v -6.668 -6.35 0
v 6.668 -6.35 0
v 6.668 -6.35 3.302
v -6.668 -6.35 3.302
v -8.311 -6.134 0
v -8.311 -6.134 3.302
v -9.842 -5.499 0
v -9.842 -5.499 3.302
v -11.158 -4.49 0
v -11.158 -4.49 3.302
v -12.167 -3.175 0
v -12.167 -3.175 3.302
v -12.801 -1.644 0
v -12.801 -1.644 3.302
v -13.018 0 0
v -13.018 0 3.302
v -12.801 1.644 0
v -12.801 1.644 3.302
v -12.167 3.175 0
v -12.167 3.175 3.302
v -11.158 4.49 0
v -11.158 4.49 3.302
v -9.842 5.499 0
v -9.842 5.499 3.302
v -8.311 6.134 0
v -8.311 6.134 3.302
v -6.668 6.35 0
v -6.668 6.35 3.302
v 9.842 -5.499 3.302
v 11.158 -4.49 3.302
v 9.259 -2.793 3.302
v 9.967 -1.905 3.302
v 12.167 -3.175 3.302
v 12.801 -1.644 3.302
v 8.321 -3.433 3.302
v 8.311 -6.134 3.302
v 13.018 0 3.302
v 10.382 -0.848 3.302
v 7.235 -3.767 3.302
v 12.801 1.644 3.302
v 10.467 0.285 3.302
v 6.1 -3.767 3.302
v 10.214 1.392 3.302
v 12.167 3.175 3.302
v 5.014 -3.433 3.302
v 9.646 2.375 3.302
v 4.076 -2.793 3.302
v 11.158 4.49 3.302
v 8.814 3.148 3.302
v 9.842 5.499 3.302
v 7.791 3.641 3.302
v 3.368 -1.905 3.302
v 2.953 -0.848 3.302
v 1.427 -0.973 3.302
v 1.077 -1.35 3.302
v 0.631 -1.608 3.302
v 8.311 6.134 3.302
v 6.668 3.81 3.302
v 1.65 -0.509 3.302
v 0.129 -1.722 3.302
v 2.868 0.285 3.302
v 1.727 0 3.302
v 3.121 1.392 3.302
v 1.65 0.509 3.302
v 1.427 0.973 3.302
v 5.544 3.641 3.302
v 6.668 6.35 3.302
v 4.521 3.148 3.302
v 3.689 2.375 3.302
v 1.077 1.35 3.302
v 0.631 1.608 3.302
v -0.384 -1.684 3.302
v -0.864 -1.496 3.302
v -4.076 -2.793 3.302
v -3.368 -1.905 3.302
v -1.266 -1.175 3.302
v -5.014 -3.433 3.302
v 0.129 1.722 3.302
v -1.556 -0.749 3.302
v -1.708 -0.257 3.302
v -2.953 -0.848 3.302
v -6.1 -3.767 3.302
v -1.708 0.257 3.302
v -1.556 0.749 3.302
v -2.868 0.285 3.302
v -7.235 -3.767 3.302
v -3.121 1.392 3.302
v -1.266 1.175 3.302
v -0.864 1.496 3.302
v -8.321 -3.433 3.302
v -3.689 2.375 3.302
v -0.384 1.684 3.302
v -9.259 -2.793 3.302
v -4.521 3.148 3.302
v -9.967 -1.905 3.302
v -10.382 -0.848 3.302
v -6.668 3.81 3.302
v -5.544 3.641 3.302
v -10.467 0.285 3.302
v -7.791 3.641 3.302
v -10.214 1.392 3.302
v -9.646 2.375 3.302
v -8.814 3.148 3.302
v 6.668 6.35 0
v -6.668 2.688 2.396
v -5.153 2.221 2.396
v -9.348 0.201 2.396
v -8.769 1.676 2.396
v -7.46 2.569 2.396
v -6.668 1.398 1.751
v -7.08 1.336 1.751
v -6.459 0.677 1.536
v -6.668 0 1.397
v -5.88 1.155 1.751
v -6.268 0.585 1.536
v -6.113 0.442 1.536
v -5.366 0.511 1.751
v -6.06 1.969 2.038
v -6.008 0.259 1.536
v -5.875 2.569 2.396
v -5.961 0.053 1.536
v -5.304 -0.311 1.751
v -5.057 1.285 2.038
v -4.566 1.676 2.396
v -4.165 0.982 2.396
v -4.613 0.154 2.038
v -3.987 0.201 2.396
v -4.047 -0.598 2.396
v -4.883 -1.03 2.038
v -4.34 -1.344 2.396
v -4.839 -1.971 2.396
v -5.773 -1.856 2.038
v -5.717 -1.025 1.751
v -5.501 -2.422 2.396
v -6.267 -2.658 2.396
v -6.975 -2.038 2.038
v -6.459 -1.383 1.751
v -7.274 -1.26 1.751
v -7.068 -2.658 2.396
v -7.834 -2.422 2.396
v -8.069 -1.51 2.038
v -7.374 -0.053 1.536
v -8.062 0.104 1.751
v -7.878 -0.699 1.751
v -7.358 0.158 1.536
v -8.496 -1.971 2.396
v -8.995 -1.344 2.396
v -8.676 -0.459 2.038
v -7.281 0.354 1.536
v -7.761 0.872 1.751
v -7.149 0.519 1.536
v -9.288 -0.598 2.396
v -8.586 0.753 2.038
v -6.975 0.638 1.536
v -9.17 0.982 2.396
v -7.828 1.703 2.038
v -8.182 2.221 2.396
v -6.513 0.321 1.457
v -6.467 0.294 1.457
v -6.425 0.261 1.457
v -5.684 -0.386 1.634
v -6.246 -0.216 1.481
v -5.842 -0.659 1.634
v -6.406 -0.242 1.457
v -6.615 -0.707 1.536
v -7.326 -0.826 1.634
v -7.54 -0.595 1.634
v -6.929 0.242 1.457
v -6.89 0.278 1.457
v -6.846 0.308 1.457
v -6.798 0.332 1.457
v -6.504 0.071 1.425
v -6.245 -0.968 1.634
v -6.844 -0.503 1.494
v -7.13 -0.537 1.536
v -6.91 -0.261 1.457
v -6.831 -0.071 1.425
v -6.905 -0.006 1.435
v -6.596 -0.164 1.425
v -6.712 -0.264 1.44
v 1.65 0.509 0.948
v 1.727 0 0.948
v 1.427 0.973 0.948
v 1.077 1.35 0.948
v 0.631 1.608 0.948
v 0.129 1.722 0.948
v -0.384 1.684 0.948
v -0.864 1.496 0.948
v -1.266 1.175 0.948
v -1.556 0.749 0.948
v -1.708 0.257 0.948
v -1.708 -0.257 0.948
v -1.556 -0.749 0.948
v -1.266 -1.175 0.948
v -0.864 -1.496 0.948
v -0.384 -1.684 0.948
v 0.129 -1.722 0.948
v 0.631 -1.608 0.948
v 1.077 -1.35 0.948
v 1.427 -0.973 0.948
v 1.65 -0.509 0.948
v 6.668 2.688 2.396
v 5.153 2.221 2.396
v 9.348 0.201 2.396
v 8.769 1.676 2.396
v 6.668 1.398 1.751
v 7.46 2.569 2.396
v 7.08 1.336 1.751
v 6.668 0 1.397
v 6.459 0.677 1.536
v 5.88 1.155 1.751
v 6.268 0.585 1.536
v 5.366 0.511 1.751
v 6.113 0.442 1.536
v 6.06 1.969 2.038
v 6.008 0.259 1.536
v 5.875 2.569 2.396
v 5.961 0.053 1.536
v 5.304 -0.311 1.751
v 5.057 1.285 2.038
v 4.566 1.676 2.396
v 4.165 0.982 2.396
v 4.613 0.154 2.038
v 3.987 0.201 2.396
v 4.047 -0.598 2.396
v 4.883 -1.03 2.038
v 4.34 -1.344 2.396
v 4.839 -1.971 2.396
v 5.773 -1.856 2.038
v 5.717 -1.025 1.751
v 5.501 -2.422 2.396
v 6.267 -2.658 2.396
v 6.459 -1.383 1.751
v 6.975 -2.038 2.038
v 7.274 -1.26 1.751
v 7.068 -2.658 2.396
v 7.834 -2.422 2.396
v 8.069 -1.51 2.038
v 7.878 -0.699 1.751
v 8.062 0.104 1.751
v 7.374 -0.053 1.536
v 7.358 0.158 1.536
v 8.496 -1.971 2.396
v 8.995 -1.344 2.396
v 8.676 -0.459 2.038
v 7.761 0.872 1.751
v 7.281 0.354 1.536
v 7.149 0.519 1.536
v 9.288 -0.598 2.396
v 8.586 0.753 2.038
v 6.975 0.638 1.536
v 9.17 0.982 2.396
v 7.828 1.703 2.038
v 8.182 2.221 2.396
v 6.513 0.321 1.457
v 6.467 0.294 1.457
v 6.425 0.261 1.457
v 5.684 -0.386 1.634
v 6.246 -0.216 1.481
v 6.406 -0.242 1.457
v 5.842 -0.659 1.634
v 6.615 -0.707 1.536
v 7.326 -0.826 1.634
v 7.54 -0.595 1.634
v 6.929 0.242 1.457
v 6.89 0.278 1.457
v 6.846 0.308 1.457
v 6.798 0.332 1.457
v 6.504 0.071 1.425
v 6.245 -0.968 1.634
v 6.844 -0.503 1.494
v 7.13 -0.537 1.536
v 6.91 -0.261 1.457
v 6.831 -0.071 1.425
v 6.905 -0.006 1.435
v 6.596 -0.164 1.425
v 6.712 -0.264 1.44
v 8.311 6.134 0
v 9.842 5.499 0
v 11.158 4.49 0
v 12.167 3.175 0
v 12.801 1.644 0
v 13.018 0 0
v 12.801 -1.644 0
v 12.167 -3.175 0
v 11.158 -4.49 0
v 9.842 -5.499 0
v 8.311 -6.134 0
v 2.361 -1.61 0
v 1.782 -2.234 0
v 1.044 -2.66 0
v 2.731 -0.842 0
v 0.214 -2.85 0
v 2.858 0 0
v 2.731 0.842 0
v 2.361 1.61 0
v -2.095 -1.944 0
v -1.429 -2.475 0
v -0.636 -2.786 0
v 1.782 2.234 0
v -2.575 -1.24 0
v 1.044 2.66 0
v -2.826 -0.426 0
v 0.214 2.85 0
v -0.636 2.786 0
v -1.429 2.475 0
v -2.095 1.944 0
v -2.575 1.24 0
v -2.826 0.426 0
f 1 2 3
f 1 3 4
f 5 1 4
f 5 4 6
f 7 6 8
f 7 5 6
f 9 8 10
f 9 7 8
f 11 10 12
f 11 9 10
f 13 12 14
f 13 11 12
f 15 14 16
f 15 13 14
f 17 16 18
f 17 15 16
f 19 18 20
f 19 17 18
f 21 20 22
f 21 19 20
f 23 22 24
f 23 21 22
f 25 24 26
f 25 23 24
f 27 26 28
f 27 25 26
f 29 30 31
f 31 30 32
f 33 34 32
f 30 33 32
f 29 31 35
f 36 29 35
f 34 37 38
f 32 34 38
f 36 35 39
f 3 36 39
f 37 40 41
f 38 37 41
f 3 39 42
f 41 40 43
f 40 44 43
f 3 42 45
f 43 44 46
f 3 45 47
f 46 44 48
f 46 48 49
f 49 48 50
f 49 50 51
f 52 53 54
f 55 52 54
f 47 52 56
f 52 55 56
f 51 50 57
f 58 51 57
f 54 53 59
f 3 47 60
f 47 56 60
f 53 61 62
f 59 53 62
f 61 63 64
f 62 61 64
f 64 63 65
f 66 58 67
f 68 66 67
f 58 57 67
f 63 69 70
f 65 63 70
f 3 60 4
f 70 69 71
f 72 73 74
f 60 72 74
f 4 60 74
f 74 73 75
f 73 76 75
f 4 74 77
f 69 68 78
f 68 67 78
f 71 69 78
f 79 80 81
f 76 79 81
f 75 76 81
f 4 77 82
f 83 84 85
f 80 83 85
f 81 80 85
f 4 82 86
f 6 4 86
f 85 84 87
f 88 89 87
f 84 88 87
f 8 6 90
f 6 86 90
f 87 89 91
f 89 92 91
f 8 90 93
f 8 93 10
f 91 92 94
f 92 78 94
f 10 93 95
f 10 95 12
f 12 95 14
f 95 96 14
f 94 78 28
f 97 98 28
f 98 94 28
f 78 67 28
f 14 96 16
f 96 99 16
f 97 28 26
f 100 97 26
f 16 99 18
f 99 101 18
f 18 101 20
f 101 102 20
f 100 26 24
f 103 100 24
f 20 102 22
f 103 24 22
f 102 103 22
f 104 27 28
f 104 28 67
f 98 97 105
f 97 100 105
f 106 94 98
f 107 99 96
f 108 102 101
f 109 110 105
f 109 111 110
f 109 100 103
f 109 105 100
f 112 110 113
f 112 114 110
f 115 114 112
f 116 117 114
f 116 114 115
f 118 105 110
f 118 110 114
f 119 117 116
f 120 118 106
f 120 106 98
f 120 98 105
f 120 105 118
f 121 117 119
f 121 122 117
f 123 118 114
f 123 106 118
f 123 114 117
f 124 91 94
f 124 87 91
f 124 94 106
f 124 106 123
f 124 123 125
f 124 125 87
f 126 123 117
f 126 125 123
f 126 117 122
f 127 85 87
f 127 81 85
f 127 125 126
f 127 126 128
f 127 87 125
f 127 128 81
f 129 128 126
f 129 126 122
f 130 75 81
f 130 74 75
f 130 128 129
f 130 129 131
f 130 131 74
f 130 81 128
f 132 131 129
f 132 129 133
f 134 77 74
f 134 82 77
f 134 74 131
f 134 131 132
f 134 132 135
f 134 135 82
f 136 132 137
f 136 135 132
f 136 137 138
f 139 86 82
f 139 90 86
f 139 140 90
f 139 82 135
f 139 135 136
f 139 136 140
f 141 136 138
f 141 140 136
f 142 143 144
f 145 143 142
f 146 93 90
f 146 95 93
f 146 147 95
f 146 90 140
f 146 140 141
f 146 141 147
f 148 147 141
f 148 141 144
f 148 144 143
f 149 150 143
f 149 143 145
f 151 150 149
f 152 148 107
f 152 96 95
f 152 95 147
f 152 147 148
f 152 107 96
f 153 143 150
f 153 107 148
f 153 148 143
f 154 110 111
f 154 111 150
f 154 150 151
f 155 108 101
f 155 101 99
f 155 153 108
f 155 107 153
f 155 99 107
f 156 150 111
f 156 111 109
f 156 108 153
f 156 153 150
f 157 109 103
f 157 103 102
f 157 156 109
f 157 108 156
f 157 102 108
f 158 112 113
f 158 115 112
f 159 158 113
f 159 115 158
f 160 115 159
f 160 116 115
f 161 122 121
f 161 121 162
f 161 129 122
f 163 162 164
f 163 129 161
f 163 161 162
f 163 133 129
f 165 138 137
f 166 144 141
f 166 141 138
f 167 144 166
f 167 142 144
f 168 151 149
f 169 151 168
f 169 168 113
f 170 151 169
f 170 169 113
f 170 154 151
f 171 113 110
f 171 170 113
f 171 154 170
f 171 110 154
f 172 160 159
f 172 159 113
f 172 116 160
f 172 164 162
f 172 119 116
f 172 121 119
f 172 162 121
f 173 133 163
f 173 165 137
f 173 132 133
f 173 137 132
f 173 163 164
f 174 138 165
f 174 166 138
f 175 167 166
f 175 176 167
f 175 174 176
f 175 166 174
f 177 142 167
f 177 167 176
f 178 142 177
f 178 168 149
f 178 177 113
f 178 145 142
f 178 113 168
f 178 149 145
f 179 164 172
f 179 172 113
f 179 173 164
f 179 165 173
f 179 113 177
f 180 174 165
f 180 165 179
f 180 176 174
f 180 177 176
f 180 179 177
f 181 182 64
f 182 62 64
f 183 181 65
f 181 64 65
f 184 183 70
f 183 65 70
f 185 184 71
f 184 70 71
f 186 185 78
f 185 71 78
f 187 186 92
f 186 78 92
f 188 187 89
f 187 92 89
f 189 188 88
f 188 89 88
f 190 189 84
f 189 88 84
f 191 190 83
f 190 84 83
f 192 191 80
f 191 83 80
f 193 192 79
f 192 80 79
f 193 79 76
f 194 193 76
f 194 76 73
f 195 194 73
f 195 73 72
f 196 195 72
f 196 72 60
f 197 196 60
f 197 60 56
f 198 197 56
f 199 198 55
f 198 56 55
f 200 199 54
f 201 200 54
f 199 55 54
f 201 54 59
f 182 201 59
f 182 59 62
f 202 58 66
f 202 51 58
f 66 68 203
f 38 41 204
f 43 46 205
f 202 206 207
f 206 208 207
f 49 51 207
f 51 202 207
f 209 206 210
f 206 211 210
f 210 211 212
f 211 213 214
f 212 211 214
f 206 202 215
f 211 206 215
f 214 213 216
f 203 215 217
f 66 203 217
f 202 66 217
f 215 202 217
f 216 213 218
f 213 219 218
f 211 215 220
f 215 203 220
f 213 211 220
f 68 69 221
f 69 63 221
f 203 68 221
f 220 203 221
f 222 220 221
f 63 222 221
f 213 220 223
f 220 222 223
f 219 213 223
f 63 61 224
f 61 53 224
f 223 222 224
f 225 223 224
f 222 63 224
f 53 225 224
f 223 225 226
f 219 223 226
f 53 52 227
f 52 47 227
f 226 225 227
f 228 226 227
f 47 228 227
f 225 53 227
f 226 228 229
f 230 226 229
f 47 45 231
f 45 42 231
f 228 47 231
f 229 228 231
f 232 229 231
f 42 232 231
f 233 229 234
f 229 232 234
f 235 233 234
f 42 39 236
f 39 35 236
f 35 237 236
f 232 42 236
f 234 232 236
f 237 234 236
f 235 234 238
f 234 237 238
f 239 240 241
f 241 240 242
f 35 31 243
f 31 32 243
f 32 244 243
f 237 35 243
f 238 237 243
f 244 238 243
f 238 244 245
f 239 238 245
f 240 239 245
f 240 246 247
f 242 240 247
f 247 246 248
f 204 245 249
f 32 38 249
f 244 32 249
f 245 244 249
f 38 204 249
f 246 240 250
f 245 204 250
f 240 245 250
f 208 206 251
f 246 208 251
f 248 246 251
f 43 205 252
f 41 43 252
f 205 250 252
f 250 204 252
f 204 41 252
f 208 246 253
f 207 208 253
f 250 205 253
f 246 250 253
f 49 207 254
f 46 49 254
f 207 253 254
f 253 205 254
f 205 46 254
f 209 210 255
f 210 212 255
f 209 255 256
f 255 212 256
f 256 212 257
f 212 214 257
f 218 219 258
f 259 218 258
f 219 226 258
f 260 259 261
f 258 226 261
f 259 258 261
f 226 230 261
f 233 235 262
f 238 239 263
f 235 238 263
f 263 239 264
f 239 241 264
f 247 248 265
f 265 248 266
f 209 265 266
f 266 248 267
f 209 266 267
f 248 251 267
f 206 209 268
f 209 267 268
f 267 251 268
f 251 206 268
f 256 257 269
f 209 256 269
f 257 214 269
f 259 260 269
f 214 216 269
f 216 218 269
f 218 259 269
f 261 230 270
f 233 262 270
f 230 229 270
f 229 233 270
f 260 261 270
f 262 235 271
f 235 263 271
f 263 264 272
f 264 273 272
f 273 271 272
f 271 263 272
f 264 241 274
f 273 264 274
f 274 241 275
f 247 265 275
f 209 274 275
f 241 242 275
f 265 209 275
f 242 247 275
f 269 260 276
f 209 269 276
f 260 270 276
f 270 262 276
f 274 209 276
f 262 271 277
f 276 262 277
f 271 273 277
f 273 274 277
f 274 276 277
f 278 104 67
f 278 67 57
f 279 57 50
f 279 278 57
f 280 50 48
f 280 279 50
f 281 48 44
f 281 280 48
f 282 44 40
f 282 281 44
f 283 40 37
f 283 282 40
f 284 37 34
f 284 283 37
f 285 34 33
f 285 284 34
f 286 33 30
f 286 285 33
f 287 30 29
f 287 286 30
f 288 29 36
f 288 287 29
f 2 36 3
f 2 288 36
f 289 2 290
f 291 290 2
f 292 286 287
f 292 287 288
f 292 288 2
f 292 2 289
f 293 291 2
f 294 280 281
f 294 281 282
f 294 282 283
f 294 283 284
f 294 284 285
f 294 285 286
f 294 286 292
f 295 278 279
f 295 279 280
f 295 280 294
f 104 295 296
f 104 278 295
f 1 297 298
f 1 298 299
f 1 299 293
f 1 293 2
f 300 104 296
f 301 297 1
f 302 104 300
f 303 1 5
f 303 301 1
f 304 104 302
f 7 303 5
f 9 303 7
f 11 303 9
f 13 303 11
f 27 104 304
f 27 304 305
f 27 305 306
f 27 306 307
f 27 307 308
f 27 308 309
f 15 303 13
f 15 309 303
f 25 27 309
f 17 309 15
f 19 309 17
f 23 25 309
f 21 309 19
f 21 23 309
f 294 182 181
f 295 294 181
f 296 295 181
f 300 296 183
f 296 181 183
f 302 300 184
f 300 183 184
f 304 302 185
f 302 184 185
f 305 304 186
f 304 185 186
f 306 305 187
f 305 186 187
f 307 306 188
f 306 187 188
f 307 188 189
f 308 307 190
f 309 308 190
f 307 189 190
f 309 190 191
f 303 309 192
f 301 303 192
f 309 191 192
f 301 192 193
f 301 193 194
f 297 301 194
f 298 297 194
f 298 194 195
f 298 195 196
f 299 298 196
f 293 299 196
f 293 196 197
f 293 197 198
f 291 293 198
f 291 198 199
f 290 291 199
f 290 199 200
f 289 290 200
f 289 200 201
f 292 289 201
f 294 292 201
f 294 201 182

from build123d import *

# Parameters (mm, degrees)
BOSS_EXTRUDE1_DEPTH                               = 3.302
CSK_FOR_4_FLAT_HEAD_MACHINE_SCREW_100_D           = 3.4544
CSK_FOR_4_FLAT_HEAD_MACHINE_SCREW_100_CSINK_D     = 5.715
CSK_FOR_4_FLAT_HEAD_MACHINE_SCREW_100_CSINK_ANGLE = 100


with BuildPart() as part:
    # Sketch1 → Boss-Extrude1 (new body)
    with BuildSketch(Plane.XY):
        with BuildLine():
            Line((-6.6675, 6.35), (6.6675, 6.35))
            ThreePointArc((6.6675, 6.35), (13.0175, 0), (6.6675, -6.35))
            Line((6.6675, -6.35), (-6.6675, -6.35))
            ThreePointArc((-6.6675, -6.35), (-13.0175, 0), (-6.6675, 6.35))
        make_face()
    extrude(amount=BOSS_EXTRUDE1_DEPTH)

    # Sketch4 → Cut-Revolve3 (revolve, cut)
    with BuildSketch(Plane(origin=(6.6675, 0, 0), x_dir=(0, 0, -1), z_dir=(1, 0, 0))):
        with BuildLine():
            Line((-3.302, 3.81), (-3.302, 0))
            Line((-3.302, 0), (-1.397, 0))
            ThreePointArc((-1.397, 0), (-2.038412152, 2.060543924), (-3.302, 3.81))
        make_face()
    cut_revolve3 = revolve(axis=Axis((6.6675, 0, 1.397), (0, 0, 1)), mode=Mode.SUBTRACT)

    # Mirror1: Cut-Revolve3 across plane
    add(cut_revolve3.mirror(Plane(origin=(0, 0, 0), x_dir=(0, 0, 1), z_dir=(1, 0, 0))), mode=Mode.SUBTRACT)

    # CSK for #4 Flat Head Machine Screw (100)1 (through all)
    with Locations(Plane(origin=(0, 0, 0), x_dir=(-1, 0, 0), z_dir=(0, 0, -1))):
        with Locations((0, 0)):
            CounterSinkHole(CSK_FOR_4_FLAT_HEAD_MACHINE_SCREW_100_D / 2, CSK_FOR_4_FLAT_HEAD_MACHINE_SCREW_100_CSINK_D / 2, counter_sink_angle=CSK_FOR_4_FLAT_HEAD_MACHINE_SCREW_100_CSINK_ANGLE)


solid = part.part
